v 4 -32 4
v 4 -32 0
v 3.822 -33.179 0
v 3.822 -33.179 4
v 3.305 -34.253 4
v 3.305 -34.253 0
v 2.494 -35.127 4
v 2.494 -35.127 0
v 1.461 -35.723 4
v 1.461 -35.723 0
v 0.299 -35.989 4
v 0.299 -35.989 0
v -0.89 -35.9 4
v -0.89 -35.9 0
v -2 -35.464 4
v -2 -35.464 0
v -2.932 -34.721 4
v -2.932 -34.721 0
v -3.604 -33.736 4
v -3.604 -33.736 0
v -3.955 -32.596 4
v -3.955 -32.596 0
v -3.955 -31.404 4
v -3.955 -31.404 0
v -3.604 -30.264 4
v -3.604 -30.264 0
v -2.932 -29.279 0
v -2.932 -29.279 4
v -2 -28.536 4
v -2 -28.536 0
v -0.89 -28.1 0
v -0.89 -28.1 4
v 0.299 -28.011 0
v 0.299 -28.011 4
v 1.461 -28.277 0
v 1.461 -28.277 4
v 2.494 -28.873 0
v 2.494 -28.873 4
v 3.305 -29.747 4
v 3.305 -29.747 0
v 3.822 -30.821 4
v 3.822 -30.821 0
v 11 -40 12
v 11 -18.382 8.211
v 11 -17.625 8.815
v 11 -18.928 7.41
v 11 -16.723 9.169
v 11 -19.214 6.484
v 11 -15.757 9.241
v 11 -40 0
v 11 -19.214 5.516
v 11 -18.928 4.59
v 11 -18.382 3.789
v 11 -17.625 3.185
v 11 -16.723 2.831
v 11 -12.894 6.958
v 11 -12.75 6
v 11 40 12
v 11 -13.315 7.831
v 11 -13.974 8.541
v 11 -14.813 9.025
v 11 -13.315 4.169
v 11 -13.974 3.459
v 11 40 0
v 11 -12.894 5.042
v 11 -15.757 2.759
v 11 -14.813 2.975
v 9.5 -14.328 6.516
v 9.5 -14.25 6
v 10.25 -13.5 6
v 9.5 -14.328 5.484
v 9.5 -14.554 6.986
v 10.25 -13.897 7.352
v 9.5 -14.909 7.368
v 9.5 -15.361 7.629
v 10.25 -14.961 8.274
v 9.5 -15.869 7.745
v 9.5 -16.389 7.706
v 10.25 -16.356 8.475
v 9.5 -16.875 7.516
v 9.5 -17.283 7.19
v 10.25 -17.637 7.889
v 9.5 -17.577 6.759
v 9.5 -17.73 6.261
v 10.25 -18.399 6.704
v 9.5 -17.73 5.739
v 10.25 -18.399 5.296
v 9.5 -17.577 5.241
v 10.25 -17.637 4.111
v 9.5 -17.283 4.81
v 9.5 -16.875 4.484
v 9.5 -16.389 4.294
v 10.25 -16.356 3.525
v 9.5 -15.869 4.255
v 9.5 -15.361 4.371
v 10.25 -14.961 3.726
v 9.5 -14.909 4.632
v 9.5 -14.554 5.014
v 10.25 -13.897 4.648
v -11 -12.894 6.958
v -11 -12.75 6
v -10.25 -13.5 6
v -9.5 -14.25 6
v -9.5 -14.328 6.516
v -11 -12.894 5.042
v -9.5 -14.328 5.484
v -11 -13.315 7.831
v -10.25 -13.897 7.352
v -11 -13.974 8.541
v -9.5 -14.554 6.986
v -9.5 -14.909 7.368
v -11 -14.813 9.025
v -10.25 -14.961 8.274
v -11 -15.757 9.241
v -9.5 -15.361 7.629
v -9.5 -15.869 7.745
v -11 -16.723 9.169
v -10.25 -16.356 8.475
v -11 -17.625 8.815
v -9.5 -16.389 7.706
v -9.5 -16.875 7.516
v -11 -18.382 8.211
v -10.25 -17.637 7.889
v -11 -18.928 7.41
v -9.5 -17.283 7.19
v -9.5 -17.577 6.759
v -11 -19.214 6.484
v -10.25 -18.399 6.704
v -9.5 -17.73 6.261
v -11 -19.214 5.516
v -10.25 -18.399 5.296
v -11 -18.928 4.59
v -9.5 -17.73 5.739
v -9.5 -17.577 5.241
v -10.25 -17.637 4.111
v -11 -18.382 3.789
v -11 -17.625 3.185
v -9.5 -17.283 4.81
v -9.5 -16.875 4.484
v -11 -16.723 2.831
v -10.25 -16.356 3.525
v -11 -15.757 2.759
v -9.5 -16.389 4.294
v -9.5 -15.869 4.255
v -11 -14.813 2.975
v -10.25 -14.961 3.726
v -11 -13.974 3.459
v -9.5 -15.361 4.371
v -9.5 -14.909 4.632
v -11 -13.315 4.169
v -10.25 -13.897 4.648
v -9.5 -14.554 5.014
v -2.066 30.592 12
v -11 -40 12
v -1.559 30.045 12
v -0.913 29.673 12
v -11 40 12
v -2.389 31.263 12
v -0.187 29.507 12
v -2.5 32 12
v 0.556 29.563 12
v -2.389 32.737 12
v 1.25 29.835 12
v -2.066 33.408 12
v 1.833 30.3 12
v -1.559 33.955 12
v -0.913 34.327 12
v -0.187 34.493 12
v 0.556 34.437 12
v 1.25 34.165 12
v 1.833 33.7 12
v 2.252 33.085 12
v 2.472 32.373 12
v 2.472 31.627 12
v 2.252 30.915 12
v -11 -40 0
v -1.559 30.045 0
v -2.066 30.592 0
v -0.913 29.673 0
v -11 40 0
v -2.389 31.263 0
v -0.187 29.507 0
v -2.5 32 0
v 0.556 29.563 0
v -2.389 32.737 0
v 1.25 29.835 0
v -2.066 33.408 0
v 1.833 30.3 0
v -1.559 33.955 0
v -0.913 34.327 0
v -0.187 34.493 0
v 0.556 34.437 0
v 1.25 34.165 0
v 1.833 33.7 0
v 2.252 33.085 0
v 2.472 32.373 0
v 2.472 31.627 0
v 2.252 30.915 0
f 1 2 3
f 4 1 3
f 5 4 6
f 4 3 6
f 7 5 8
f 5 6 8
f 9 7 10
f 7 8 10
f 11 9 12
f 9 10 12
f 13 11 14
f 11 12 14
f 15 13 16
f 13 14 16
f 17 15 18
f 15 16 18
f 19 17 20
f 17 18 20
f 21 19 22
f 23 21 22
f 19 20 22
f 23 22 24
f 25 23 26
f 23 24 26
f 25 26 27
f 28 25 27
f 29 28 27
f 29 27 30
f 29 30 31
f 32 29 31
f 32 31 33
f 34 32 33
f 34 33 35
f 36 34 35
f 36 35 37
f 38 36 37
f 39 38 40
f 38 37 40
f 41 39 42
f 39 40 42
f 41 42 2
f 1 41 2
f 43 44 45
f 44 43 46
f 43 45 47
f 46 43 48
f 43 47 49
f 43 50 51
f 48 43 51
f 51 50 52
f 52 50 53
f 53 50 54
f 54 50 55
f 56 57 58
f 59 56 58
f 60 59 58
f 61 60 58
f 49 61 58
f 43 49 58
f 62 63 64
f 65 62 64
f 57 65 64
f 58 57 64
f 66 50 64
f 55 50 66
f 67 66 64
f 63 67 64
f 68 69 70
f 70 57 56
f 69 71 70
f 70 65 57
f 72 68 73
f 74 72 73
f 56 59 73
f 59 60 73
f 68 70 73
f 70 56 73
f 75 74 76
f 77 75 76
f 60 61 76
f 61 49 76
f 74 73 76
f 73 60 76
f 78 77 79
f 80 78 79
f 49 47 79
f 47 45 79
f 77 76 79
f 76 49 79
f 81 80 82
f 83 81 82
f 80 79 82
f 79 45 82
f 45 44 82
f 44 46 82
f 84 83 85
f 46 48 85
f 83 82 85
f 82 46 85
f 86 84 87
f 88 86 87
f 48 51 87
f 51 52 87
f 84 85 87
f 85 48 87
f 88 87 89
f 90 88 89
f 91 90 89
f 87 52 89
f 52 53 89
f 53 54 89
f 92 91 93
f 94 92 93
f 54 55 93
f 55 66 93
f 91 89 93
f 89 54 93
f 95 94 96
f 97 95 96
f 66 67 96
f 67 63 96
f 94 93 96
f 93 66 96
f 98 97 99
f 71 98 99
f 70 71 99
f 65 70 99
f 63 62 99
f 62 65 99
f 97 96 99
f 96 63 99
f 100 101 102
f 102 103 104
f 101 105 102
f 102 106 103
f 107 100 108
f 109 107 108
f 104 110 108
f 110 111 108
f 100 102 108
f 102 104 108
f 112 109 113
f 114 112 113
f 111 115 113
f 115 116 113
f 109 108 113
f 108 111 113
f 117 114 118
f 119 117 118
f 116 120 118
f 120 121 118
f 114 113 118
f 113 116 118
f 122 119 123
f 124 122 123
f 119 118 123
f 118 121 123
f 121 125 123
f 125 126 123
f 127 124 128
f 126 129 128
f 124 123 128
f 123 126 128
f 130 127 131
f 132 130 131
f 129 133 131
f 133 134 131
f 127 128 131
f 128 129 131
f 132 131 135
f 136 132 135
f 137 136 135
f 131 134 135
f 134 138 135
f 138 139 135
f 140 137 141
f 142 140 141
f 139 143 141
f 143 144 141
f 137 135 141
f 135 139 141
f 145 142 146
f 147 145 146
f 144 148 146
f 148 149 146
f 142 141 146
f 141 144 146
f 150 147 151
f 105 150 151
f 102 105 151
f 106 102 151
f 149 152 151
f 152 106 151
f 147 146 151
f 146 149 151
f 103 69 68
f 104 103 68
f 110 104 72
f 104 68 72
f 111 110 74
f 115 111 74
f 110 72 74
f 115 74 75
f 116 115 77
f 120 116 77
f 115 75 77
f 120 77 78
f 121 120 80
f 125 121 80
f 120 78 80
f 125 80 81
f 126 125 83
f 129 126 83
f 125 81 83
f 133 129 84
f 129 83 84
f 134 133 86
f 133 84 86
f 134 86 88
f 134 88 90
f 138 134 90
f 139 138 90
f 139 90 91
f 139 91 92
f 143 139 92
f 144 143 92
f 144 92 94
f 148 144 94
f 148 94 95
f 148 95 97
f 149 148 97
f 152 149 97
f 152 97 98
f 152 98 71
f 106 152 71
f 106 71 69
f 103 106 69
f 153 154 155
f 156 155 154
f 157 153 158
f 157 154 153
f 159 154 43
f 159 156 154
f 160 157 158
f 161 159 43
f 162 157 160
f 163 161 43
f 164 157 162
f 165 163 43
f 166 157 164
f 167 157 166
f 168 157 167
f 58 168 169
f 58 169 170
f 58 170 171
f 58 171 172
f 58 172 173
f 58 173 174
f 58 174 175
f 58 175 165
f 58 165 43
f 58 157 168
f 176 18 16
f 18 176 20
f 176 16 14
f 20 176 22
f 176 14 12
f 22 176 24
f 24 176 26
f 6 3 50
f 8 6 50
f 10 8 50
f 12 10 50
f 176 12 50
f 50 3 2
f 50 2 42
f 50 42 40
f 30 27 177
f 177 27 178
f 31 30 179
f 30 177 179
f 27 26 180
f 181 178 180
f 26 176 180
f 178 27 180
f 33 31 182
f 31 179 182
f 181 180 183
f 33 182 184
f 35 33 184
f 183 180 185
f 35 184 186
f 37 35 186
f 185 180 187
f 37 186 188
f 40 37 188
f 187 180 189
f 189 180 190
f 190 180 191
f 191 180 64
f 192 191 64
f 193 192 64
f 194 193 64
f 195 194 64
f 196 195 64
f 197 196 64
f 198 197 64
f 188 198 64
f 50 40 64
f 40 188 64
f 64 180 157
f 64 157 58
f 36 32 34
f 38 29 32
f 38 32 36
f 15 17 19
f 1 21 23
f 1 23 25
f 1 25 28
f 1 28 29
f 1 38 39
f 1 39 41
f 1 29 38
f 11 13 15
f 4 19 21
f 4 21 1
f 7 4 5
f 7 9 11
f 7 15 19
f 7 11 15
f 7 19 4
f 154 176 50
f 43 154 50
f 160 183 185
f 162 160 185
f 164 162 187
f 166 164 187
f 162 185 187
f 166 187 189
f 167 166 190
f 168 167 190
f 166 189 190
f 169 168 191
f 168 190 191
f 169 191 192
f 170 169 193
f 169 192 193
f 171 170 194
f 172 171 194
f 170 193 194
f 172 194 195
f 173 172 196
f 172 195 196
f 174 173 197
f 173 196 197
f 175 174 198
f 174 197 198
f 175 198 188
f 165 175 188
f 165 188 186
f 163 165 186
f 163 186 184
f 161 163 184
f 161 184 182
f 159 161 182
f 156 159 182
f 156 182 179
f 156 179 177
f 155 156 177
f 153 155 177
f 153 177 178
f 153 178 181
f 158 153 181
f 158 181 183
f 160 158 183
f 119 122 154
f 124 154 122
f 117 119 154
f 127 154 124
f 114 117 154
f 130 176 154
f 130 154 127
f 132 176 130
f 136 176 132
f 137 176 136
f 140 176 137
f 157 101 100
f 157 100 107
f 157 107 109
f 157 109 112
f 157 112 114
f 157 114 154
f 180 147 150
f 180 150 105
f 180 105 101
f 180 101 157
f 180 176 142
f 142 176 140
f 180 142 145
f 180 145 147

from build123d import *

# Parameters (mm, degrees)
F0_W     = 22
F0_H     = 80
F1_DEPTH = 12
F2_R     = 1.75
F3_DEPTH = 25
F4_SIZE  = 1.5
F5_R     = 4
F6_DEPTH = 4
F8_D     = 5


with BuildPart() as f1:
    # F0 (on Top) → F1 (new body)
    with BuildSketch(Plane.XY):
        Rectangle(F0_W, F0_H)
    extrude(amount=F1_DEPTH)

    # F2 (on face) → F3 (cut)
    with BuildSketch(Plane.YZ.offset(11)):
        with Locations((-16, 6)):
            Circle(F2_R)
    extrude(amount=-F3_DEPTH, mode=Mode.SUBTRACT)

    # F4
    f4_edges = [f1.edges().sort_by_distance(p)[0] for p in [
        (11, -17.75, 6),
        (-11, -17.75, 6),
    ]]
    chamfer(f4_edges, length=F4_SIZE)

    # F5 (on face) → F6 (cut)
    with BuildSketch(Plane(origin=(0, 0, 0), x_dir=(1, 0, 0), z_dir=(0, 0, -1))):
        with Locations((0, 32)):
            Circle(F5_R)
    extrude(amount=-F6_DEPTH, mode=Mode.SUBTRACT)

    # F8 (through all)
    with Locations(Plane.XY.offset(12)):
        with Locations((0, 32)):
            Hole(F8_D / 2)


solid = f1.part
